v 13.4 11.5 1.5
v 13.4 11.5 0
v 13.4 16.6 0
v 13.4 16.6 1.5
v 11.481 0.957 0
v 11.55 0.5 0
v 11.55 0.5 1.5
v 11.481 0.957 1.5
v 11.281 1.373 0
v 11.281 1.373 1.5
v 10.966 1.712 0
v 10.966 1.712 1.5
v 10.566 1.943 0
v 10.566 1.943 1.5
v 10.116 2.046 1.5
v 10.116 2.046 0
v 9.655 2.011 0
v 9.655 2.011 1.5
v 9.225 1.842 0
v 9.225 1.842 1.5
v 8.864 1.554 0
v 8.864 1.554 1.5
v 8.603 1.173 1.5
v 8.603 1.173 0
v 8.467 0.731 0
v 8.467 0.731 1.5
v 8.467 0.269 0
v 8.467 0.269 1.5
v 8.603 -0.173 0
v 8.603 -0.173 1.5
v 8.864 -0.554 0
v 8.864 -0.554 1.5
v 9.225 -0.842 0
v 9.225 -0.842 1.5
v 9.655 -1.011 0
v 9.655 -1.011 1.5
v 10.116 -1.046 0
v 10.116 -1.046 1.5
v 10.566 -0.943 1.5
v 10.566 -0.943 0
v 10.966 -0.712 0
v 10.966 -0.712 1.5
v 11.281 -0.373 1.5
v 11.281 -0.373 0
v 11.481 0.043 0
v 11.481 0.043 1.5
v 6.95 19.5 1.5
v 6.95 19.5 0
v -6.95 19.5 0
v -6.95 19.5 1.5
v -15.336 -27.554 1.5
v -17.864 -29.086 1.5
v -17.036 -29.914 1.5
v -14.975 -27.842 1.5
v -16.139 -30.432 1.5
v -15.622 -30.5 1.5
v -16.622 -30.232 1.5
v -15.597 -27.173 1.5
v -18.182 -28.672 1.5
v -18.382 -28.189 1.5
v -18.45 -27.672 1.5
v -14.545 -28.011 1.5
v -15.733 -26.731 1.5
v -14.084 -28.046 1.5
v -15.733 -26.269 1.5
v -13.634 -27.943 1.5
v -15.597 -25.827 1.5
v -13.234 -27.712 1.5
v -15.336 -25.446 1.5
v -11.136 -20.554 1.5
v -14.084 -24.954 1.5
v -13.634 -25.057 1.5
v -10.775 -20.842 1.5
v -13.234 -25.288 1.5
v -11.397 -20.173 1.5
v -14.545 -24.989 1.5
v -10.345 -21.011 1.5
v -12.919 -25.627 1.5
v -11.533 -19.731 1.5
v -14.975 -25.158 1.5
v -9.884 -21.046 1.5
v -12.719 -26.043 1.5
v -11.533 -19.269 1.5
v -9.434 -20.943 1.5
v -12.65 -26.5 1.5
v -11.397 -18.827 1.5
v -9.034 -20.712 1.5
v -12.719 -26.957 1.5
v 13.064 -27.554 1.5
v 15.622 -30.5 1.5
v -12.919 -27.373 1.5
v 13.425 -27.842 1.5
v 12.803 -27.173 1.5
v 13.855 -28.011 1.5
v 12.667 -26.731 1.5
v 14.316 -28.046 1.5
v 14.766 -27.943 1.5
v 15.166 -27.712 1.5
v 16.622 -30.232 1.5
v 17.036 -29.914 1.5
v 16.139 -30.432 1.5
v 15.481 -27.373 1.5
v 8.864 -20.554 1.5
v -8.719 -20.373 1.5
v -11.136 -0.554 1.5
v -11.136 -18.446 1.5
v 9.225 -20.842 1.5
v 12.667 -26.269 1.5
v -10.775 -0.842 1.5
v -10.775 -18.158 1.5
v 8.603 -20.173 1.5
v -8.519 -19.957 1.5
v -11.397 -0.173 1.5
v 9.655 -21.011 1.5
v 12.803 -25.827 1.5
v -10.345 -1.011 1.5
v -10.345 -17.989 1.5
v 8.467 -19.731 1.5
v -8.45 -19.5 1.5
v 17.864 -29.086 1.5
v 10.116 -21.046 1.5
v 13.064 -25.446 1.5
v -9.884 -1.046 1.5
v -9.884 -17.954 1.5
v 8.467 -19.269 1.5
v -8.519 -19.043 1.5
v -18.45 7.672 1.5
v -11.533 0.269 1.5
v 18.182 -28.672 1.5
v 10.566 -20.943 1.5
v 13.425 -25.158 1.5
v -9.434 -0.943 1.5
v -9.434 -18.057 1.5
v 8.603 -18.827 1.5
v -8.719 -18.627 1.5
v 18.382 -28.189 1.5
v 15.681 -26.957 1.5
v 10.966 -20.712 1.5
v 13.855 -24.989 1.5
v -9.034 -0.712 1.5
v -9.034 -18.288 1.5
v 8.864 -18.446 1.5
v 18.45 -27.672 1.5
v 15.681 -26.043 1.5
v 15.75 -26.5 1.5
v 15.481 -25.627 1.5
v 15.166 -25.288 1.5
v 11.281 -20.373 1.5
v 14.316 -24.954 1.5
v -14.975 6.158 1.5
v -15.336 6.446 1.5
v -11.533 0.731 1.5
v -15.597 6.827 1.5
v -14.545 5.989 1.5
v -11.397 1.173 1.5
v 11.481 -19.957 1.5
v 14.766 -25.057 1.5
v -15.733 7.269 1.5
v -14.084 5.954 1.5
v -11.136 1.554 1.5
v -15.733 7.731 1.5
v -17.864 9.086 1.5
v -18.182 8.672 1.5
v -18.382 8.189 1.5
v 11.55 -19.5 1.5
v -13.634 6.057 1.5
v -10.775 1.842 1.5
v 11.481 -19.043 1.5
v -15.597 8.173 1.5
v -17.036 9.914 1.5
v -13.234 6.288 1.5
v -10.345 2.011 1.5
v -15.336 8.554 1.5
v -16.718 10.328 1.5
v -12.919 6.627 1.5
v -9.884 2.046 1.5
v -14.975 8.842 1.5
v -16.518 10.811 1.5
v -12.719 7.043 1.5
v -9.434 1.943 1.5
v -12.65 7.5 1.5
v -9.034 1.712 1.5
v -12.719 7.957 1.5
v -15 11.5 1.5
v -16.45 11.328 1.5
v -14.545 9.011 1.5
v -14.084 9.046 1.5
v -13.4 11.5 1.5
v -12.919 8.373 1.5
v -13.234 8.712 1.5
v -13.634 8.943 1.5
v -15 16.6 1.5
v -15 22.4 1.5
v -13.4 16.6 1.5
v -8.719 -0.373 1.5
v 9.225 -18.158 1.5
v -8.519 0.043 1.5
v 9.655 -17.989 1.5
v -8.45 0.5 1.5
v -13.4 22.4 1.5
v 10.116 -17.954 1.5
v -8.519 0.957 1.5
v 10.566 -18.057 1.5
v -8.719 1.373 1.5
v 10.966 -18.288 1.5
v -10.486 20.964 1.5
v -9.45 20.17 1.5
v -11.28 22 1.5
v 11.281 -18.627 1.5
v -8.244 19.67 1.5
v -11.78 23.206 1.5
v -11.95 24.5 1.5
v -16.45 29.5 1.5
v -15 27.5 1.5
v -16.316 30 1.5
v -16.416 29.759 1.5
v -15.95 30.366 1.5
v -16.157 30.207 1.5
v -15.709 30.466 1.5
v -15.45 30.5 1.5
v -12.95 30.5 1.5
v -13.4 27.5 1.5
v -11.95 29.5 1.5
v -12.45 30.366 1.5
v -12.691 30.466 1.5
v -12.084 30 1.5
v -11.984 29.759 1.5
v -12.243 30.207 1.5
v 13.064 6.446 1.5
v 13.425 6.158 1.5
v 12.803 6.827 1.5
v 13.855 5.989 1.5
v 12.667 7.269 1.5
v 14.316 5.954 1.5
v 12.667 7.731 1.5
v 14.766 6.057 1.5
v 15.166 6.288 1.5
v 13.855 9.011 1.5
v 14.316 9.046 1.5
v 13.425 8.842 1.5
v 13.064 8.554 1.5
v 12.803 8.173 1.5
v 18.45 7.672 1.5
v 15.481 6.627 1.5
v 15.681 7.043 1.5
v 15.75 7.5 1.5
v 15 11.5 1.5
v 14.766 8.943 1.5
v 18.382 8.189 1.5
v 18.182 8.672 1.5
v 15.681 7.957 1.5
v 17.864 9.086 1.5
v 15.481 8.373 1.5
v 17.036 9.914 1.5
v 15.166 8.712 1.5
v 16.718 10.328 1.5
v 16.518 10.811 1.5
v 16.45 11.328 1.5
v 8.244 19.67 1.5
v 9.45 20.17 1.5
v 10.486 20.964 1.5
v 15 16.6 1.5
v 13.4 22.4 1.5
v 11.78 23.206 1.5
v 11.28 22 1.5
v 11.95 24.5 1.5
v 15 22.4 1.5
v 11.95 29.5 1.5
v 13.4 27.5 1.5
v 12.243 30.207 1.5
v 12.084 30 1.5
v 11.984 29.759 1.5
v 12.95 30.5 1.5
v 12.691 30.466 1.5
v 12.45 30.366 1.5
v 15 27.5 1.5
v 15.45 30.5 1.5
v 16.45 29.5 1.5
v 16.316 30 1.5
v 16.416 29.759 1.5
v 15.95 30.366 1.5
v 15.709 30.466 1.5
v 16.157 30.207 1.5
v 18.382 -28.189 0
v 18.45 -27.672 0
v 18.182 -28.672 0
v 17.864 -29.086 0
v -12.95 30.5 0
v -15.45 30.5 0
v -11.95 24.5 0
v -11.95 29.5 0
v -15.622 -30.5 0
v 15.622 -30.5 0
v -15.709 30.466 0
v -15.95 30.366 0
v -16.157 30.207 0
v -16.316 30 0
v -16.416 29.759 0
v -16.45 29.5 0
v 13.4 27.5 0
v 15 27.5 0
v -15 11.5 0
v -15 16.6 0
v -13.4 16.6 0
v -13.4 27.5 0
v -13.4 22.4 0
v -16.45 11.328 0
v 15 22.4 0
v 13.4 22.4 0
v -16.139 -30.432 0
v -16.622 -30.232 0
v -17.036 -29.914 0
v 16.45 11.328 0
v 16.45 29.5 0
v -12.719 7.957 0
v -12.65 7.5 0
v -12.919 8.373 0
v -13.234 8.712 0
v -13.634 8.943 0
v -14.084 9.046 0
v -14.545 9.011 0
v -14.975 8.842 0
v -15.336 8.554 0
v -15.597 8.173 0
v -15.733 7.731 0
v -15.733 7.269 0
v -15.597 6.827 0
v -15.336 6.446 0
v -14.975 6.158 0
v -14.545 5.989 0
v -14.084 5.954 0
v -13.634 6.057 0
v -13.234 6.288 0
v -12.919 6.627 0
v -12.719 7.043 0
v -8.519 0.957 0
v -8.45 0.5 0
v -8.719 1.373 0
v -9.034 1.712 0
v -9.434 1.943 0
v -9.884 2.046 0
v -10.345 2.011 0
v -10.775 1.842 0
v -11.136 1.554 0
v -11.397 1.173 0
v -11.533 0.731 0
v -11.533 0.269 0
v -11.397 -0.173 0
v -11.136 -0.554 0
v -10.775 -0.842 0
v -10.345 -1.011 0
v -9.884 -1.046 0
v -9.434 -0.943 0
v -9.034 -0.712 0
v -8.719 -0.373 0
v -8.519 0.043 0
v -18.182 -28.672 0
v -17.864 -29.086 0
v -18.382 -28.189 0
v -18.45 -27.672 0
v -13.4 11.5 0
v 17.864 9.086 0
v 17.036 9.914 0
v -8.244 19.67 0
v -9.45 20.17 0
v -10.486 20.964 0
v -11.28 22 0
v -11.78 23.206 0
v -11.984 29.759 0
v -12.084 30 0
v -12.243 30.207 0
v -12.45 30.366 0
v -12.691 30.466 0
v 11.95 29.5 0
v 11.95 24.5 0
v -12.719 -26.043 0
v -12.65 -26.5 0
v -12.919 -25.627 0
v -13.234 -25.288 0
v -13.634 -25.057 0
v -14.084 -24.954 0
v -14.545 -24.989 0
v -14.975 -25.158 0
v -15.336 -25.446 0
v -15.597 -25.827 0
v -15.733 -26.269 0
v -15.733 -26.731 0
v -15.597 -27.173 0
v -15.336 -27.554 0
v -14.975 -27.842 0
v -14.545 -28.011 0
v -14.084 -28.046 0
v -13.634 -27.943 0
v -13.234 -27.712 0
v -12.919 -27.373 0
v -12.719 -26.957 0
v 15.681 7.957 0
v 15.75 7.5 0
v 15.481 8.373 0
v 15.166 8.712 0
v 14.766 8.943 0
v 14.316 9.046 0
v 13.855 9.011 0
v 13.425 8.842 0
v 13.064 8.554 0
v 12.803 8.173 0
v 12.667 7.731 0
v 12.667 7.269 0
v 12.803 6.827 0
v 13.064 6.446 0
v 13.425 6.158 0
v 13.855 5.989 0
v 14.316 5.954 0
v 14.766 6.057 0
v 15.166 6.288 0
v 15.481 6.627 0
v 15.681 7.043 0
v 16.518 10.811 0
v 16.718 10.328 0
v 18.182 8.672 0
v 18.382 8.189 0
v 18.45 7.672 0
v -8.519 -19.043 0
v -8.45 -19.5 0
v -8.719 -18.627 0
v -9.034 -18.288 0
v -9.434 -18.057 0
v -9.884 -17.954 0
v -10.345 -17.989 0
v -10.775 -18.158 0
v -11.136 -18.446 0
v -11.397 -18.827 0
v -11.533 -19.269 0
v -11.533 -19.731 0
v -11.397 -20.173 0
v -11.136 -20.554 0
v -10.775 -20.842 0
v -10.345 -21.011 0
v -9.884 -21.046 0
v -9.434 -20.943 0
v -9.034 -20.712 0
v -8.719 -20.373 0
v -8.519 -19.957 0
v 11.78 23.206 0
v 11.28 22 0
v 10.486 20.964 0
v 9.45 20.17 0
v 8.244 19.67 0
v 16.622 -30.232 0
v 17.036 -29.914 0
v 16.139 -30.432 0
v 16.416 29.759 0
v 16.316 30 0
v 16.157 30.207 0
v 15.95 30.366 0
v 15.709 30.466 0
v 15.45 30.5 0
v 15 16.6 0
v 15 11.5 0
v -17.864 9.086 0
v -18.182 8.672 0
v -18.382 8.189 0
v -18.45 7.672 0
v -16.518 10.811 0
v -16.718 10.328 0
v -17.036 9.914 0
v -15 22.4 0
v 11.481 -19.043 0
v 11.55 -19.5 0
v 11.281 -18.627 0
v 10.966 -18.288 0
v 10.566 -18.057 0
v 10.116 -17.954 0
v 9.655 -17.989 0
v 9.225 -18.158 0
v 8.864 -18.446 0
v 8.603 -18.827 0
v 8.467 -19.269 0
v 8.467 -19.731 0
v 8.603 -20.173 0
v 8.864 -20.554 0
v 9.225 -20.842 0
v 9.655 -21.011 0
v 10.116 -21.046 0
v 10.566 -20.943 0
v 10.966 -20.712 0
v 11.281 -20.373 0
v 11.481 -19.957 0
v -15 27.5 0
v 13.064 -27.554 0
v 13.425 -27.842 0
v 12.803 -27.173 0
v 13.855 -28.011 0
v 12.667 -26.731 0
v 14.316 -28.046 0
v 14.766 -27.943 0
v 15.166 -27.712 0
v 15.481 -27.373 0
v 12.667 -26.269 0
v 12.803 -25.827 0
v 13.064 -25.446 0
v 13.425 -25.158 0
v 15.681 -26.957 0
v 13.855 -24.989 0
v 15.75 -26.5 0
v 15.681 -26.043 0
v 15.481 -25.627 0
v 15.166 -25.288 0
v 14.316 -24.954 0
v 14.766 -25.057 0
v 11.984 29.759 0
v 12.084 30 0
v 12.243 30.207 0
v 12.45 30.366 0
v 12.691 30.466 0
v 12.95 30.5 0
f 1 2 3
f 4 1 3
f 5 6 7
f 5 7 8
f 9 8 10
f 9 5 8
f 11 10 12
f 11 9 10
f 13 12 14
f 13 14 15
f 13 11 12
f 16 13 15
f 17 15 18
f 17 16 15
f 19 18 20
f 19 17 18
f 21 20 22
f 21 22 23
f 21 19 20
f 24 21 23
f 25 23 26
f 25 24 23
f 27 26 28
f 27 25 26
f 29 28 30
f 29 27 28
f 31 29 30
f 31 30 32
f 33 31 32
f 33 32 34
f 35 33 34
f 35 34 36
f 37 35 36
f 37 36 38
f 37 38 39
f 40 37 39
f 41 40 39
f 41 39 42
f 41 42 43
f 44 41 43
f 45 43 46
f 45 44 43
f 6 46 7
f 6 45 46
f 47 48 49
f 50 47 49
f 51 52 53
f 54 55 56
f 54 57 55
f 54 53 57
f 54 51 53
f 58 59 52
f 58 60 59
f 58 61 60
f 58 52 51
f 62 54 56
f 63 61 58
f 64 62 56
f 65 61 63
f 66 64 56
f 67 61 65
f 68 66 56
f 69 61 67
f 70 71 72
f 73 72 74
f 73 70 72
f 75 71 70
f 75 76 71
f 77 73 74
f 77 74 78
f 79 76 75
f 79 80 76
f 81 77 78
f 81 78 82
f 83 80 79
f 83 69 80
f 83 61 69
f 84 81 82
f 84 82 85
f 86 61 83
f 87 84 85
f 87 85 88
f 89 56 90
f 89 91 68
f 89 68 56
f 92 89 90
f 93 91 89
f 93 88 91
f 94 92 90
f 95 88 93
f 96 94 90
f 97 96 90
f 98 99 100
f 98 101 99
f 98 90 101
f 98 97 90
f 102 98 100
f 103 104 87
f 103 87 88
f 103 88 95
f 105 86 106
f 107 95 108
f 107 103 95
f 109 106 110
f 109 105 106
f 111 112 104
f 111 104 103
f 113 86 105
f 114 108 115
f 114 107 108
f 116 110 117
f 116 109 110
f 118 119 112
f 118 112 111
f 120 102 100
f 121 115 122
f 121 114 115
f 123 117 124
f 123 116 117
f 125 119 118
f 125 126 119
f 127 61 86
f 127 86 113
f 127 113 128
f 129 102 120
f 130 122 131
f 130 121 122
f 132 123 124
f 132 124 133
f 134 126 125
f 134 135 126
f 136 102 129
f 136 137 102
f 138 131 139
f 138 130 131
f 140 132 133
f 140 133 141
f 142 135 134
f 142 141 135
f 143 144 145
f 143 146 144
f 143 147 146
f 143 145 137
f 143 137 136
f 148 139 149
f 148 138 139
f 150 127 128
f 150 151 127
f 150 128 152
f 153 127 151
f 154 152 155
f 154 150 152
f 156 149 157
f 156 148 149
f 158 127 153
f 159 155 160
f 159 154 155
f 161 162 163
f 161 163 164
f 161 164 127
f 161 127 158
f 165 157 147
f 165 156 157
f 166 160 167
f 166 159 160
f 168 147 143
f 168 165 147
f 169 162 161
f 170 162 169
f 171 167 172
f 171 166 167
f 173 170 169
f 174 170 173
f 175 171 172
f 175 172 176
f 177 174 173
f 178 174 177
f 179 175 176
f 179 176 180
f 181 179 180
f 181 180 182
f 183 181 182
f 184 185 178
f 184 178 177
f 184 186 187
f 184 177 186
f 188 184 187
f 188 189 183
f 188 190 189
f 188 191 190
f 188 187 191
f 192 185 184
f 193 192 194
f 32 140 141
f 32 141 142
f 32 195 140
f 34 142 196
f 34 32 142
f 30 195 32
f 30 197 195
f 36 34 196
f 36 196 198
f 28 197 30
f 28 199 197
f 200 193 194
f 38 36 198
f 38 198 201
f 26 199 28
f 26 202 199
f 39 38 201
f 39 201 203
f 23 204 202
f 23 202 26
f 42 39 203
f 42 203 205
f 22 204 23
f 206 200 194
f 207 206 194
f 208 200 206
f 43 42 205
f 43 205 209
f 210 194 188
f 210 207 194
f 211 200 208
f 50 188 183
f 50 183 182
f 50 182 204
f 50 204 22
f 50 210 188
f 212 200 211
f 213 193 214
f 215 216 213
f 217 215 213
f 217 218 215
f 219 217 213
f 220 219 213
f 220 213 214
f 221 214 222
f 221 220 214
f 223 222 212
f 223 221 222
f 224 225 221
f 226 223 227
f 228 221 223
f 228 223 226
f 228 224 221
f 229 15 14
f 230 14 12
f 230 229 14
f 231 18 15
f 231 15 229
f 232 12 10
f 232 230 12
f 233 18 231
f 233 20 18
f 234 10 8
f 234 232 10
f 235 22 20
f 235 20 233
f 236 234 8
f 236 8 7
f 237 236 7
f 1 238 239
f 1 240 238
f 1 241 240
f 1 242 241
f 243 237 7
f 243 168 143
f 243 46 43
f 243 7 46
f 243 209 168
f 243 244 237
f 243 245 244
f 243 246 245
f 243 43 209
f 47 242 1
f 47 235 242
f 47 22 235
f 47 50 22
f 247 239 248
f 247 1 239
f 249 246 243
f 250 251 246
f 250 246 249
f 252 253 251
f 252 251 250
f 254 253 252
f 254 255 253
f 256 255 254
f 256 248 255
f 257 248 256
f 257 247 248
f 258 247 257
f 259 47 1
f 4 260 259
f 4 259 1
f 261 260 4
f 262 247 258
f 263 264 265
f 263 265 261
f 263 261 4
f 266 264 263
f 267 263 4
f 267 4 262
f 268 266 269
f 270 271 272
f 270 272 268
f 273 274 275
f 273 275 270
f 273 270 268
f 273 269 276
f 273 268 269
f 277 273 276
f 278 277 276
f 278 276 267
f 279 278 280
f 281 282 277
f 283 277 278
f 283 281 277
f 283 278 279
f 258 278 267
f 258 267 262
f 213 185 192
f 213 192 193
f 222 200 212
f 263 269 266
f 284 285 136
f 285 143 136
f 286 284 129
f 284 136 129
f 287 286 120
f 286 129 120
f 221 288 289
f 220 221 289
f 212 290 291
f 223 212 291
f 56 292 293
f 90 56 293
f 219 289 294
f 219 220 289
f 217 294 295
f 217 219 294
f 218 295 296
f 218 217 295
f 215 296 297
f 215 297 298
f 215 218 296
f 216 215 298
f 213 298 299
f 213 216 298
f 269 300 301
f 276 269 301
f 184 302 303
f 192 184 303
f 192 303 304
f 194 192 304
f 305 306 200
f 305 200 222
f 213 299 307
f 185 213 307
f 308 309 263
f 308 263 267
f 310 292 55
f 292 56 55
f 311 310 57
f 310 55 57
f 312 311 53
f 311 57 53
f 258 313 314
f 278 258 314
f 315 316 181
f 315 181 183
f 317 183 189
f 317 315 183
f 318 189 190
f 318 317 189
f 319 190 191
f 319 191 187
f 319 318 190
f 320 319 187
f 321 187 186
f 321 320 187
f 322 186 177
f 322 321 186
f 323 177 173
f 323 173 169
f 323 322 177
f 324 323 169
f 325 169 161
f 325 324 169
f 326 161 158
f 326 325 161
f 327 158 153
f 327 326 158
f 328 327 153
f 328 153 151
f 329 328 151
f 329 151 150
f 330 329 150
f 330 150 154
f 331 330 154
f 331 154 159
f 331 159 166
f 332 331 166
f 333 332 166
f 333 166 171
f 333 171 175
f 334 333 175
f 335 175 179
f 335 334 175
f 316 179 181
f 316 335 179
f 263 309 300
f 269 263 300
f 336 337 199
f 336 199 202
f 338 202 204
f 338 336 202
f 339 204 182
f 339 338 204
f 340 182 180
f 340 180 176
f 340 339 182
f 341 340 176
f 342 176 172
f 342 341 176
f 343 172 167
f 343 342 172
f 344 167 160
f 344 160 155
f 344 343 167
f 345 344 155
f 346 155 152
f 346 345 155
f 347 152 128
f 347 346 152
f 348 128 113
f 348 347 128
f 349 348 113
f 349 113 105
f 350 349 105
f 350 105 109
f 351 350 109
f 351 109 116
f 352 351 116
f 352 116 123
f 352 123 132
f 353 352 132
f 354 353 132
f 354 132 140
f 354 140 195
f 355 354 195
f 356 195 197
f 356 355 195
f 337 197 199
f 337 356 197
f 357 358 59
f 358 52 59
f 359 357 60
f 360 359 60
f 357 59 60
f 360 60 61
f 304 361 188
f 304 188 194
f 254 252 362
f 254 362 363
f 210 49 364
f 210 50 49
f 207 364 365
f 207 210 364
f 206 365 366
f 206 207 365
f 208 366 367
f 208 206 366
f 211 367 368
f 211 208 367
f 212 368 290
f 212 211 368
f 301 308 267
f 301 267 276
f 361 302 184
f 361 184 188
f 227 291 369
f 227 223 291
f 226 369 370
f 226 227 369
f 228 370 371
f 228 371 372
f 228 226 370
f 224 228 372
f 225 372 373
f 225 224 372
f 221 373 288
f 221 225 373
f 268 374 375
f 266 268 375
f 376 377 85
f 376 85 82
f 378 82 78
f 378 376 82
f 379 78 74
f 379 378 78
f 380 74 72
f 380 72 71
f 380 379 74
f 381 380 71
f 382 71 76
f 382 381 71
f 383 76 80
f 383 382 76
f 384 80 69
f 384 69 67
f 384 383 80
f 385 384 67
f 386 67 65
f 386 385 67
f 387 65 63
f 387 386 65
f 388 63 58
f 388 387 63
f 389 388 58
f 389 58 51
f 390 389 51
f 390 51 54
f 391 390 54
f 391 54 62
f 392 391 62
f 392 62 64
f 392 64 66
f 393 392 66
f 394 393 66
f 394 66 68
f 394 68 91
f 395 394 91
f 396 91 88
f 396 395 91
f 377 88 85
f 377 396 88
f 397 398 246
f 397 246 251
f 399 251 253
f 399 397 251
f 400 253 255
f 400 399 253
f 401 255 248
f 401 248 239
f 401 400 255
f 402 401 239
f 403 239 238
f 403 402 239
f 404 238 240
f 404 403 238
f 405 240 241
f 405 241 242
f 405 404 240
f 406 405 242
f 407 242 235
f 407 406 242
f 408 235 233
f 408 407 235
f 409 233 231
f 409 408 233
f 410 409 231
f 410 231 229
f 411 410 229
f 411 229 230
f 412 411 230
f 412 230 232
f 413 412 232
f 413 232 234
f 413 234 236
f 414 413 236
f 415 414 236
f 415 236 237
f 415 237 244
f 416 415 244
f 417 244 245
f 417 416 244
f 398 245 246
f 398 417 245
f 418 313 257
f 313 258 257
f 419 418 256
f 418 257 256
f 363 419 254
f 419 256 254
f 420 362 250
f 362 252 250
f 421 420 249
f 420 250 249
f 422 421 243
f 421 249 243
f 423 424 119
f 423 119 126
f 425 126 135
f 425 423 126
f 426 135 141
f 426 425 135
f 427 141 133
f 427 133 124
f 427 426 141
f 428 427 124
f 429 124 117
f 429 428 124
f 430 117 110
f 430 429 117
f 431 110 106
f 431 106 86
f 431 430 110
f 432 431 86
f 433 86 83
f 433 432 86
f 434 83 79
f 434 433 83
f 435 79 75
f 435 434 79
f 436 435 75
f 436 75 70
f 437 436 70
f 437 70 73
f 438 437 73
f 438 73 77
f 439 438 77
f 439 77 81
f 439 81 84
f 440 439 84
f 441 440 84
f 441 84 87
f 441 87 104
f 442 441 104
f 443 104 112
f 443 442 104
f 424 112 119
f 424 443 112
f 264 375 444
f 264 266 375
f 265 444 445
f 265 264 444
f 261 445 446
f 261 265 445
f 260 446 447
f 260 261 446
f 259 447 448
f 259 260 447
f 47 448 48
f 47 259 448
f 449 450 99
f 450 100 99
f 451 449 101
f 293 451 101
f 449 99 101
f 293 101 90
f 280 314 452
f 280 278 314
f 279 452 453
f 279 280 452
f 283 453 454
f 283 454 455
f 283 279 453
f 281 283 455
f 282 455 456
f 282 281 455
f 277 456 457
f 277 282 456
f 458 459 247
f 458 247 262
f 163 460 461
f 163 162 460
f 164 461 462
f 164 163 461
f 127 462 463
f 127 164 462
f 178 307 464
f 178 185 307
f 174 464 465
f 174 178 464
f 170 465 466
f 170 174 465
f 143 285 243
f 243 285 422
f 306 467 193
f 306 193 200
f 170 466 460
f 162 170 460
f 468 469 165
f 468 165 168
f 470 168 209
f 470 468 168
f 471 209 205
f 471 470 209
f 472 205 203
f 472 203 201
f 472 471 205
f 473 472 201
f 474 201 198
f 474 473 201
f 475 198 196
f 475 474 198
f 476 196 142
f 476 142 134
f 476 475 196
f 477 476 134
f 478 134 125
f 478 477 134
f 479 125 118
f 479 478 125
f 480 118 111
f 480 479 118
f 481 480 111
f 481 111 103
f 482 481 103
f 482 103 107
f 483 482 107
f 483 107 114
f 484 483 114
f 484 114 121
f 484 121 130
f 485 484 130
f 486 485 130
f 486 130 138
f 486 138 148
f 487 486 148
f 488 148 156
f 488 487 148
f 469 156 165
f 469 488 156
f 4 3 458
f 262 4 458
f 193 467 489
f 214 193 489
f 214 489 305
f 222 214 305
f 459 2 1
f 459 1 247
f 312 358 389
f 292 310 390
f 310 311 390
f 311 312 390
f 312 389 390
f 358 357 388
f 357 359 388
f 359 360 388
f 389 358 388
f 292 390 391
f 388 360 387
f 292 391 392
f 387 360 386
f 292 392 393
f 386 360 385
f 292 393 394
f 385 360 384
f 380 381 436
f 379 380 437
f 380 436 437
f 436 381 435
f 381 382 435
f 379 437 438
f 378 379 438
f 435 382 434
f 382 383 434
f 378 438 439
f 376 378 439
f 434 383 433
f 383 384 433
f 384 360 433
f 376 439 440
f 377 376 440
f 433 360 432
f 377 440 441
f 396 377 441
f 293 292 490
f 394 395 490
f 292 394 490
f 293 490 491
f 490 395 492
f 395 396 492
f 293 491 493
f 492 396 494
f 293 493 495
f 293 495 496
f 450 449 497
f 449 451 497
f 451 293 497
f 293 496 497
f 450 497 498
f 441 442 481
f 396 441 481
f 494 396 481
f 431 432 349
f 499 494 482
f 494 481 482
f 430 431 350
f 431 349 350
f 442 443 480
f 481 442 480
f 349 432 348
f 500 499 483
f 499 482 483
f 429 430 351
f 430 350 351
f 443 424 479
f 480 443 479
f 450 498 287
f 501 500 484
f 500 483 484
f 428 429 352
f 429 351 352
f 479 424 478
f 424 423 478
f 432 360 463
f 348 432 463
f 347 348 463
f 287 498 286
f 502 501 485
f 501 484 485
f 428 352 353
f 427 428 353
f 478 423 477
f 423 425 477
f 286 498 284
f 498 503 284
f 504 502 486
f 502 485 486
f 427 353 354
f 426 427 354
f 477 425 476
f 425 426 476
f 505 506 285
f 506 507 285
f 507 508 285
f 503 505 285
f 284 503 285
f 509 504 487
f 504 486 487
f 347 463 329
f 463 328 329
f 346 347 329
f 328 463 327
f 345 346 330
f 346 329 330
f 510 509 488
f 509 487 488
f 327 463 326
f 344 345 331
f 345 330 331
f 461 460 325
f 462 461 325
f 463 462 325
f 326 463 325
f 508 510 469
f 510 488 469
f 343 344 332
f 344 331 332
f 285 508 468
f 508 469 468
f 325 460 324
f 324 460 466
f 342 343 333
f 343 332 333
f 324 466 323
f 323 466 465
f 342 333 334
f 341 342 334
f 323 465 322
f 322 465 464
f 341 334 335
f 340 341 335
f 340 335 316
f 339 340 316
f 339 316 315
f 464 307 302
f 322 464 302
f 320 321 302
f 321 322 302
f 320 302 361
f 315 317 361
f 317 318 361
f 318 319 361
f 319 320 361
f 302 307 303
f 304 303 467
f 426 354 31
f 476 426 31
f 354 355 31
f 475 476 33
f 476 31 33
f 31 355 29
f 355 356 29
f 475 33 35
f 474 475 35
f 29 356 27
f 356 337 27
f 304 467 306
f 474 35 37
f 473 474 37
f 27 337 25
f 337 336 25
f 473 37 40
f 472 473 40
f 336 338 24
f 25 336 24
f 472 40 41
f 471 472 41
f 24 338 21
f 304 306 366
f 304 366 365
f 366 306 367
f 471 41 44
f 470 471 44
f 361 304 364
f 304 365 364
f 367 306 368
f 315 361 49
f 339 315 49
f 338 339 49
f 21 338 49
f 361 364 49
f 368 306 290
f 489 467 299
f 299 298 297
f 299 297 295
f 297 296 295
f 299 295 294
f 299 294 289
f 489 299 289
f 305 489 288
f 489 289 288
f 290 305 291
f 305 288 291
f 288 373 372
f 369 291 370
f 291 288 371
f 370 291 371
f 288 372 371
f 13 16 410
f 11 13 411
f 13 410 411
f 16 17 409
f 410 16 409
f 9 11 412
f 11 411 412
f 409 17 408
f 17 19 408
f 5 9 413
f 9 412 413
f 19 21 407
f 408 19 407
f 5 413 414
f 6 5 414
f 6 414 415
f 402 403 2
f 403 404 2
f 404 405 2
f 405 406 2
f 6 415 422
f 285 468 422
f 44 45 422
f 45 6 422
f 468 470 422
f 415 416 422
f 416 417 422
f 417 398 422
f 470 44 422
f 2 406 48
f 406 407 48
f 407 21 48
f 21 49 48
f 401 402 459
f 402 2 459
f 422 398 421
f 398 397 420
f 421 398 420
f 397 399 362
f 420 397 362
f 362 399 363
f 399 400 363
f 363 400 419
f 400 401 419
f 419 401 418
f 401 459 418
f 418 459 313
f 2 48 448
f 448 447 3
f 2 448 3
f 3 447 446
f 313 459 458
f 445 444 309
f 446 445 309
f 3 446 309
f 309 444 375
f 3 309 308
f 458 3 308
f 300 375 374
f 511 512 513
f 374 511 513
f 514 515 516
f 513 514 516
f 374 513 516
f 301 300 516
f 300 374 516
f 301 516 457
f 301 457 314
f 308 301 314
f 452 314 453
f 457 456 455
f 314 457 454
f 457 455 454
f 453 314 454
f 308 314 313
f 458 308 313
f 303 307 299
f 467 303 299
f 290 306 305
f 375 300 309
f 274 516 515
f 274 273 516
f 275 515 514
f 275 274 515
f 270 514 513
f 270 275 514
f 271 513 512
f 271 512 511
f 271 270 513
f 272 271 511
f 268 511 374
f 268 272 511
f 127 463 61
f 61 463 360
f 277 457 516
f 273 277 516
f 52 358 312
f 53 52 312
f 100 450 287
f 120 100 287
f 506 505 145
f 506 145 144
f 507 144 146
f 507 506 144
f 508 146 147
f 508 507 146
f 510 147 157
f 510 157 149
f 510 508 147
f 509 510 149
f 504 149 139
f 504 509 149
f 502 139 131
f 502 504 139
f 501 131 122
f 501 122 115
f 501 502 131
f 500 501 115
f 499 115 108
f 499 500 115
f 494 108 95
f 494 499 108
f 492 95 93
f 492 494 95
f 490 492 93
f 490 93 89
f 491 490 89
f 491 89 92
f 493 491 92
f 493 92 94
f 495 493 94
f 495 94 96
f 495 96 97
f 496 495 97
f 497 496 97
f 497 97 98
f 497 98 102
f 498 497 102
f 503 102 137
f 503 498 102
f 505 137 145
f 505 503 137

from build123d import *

# Parameters (mm, degrees)
F0_R     = 1.55
F0_W     = 1.6
F0_H     = 5.1
F1_DEPTH = 1.5
F2_R     = 5
F3_R     = 2
F4_R     = 1


with BuildPart() as f1:
    # F0 (on Top) → F1 (new body)
    with BuildSketch(Plane.XY):
        Polygon((-16.45, -30.5), (16.45, -30.5), (16.45, 10.5), (16.45, 30.5), (11.95, 30.5), (11.95, 19.5), (-11.95, 19.5), (-11.95, 30.5), (-16.45, 30.5), (-16.45, 10.5), align=None)
        with Locations((-14.2, -26.5)):
            Circle(F0_R, mode=Mode.SUBTRACT)
        with Locations((-10, -19.5)):
            Circle(F0_R, mode=Mode.SUBTRACT)
        with Locations((14.2, -26.5)):
            Circle(F0_R, mode=Mode.SUBTRACT)
        with Locations((10, -19.5)):
            Circle(F0_R, mode=Mode.SUBTRACT)
        with Locations((-14.2, 7.5)):
            Circle(F0_R, mode=Mode.SUBTRACT)
        with Locations((-10, 0.5)):
            Circle(F0_R, mode=Mode.SUBTRACT)
        with Locations((-14.2, 14.05)):
            Rectangle(F0_W, F0_H, mode=Mode.SUBTRACT)
        with Locations((-14.2, 24.95)):
            Rectangle(F0_W, F0_H, mode=Mode.SUBTRACT)
        with Locations((10, 0.5)):
            Circle(F0_R, mode=Mode.SUBTRACT)
        with Locations((14.2, 7.5)):
            Circle(F0_R, mode=Mode.SUBTRACT)
        with Locations((14.2, 14.05)):
            Rectangle(F0_W, F0_H, mode=Mode.SUBTRACT)
        with Locations((14.2, 24.95)):
            Rectangle(F0_W, F0_H, mode=Mode.SUBTRACT)
        Polygon((16.45, 10.5), (16.45, -30.5), (18.45, -28.5), (18.45, 8.5), align=None)
        Polygon((-18.45, -28.5), (-16.45, -30.5), (-16.45, 10.5), (-18.45, 8.5), align=None)
    extrude(amount=F1_DEPTH)

    # F2
    f2_edges = [f1.edges().sort_by_distance(p)[0] for p in [
        (-11.95, 19.5, 0.75),
        (11.95, 19.5, 0.75),
    ]]
    fillet(f2_edges, radius=F2_R)

    # F3
    f3_edges = [f1.edges().sort_by_distance(p)[0] for p in [
        (16.45, -30.5, 0.75),
        (18.45, -28.5, 0.75),
        (-18.45, -28.5, 0.75),
        (-16.45, -30.5, 0.75),
        (-18.45, 8.5, 0.75),
        (-16.45, 10.5, 0.75),
        (16.45, 10.5, 0.75),
        (18.45, 8.5, 0.75),
    ]]
    fillet(f3_edges, radius=F3_R)

    # F4
    f4_edges = [f1.edges().sort_by_distance(p)[0] for p in [
        (16.45, 30.5, 0.75),
        (11.95, 30.5, 0.75),
        (-11.95, 30.5, 0.75),
        (-16.45, 30.5, 0.75),
    ]]
    fillet(f4_edges, radius=F4_R)


solid = f1.part
